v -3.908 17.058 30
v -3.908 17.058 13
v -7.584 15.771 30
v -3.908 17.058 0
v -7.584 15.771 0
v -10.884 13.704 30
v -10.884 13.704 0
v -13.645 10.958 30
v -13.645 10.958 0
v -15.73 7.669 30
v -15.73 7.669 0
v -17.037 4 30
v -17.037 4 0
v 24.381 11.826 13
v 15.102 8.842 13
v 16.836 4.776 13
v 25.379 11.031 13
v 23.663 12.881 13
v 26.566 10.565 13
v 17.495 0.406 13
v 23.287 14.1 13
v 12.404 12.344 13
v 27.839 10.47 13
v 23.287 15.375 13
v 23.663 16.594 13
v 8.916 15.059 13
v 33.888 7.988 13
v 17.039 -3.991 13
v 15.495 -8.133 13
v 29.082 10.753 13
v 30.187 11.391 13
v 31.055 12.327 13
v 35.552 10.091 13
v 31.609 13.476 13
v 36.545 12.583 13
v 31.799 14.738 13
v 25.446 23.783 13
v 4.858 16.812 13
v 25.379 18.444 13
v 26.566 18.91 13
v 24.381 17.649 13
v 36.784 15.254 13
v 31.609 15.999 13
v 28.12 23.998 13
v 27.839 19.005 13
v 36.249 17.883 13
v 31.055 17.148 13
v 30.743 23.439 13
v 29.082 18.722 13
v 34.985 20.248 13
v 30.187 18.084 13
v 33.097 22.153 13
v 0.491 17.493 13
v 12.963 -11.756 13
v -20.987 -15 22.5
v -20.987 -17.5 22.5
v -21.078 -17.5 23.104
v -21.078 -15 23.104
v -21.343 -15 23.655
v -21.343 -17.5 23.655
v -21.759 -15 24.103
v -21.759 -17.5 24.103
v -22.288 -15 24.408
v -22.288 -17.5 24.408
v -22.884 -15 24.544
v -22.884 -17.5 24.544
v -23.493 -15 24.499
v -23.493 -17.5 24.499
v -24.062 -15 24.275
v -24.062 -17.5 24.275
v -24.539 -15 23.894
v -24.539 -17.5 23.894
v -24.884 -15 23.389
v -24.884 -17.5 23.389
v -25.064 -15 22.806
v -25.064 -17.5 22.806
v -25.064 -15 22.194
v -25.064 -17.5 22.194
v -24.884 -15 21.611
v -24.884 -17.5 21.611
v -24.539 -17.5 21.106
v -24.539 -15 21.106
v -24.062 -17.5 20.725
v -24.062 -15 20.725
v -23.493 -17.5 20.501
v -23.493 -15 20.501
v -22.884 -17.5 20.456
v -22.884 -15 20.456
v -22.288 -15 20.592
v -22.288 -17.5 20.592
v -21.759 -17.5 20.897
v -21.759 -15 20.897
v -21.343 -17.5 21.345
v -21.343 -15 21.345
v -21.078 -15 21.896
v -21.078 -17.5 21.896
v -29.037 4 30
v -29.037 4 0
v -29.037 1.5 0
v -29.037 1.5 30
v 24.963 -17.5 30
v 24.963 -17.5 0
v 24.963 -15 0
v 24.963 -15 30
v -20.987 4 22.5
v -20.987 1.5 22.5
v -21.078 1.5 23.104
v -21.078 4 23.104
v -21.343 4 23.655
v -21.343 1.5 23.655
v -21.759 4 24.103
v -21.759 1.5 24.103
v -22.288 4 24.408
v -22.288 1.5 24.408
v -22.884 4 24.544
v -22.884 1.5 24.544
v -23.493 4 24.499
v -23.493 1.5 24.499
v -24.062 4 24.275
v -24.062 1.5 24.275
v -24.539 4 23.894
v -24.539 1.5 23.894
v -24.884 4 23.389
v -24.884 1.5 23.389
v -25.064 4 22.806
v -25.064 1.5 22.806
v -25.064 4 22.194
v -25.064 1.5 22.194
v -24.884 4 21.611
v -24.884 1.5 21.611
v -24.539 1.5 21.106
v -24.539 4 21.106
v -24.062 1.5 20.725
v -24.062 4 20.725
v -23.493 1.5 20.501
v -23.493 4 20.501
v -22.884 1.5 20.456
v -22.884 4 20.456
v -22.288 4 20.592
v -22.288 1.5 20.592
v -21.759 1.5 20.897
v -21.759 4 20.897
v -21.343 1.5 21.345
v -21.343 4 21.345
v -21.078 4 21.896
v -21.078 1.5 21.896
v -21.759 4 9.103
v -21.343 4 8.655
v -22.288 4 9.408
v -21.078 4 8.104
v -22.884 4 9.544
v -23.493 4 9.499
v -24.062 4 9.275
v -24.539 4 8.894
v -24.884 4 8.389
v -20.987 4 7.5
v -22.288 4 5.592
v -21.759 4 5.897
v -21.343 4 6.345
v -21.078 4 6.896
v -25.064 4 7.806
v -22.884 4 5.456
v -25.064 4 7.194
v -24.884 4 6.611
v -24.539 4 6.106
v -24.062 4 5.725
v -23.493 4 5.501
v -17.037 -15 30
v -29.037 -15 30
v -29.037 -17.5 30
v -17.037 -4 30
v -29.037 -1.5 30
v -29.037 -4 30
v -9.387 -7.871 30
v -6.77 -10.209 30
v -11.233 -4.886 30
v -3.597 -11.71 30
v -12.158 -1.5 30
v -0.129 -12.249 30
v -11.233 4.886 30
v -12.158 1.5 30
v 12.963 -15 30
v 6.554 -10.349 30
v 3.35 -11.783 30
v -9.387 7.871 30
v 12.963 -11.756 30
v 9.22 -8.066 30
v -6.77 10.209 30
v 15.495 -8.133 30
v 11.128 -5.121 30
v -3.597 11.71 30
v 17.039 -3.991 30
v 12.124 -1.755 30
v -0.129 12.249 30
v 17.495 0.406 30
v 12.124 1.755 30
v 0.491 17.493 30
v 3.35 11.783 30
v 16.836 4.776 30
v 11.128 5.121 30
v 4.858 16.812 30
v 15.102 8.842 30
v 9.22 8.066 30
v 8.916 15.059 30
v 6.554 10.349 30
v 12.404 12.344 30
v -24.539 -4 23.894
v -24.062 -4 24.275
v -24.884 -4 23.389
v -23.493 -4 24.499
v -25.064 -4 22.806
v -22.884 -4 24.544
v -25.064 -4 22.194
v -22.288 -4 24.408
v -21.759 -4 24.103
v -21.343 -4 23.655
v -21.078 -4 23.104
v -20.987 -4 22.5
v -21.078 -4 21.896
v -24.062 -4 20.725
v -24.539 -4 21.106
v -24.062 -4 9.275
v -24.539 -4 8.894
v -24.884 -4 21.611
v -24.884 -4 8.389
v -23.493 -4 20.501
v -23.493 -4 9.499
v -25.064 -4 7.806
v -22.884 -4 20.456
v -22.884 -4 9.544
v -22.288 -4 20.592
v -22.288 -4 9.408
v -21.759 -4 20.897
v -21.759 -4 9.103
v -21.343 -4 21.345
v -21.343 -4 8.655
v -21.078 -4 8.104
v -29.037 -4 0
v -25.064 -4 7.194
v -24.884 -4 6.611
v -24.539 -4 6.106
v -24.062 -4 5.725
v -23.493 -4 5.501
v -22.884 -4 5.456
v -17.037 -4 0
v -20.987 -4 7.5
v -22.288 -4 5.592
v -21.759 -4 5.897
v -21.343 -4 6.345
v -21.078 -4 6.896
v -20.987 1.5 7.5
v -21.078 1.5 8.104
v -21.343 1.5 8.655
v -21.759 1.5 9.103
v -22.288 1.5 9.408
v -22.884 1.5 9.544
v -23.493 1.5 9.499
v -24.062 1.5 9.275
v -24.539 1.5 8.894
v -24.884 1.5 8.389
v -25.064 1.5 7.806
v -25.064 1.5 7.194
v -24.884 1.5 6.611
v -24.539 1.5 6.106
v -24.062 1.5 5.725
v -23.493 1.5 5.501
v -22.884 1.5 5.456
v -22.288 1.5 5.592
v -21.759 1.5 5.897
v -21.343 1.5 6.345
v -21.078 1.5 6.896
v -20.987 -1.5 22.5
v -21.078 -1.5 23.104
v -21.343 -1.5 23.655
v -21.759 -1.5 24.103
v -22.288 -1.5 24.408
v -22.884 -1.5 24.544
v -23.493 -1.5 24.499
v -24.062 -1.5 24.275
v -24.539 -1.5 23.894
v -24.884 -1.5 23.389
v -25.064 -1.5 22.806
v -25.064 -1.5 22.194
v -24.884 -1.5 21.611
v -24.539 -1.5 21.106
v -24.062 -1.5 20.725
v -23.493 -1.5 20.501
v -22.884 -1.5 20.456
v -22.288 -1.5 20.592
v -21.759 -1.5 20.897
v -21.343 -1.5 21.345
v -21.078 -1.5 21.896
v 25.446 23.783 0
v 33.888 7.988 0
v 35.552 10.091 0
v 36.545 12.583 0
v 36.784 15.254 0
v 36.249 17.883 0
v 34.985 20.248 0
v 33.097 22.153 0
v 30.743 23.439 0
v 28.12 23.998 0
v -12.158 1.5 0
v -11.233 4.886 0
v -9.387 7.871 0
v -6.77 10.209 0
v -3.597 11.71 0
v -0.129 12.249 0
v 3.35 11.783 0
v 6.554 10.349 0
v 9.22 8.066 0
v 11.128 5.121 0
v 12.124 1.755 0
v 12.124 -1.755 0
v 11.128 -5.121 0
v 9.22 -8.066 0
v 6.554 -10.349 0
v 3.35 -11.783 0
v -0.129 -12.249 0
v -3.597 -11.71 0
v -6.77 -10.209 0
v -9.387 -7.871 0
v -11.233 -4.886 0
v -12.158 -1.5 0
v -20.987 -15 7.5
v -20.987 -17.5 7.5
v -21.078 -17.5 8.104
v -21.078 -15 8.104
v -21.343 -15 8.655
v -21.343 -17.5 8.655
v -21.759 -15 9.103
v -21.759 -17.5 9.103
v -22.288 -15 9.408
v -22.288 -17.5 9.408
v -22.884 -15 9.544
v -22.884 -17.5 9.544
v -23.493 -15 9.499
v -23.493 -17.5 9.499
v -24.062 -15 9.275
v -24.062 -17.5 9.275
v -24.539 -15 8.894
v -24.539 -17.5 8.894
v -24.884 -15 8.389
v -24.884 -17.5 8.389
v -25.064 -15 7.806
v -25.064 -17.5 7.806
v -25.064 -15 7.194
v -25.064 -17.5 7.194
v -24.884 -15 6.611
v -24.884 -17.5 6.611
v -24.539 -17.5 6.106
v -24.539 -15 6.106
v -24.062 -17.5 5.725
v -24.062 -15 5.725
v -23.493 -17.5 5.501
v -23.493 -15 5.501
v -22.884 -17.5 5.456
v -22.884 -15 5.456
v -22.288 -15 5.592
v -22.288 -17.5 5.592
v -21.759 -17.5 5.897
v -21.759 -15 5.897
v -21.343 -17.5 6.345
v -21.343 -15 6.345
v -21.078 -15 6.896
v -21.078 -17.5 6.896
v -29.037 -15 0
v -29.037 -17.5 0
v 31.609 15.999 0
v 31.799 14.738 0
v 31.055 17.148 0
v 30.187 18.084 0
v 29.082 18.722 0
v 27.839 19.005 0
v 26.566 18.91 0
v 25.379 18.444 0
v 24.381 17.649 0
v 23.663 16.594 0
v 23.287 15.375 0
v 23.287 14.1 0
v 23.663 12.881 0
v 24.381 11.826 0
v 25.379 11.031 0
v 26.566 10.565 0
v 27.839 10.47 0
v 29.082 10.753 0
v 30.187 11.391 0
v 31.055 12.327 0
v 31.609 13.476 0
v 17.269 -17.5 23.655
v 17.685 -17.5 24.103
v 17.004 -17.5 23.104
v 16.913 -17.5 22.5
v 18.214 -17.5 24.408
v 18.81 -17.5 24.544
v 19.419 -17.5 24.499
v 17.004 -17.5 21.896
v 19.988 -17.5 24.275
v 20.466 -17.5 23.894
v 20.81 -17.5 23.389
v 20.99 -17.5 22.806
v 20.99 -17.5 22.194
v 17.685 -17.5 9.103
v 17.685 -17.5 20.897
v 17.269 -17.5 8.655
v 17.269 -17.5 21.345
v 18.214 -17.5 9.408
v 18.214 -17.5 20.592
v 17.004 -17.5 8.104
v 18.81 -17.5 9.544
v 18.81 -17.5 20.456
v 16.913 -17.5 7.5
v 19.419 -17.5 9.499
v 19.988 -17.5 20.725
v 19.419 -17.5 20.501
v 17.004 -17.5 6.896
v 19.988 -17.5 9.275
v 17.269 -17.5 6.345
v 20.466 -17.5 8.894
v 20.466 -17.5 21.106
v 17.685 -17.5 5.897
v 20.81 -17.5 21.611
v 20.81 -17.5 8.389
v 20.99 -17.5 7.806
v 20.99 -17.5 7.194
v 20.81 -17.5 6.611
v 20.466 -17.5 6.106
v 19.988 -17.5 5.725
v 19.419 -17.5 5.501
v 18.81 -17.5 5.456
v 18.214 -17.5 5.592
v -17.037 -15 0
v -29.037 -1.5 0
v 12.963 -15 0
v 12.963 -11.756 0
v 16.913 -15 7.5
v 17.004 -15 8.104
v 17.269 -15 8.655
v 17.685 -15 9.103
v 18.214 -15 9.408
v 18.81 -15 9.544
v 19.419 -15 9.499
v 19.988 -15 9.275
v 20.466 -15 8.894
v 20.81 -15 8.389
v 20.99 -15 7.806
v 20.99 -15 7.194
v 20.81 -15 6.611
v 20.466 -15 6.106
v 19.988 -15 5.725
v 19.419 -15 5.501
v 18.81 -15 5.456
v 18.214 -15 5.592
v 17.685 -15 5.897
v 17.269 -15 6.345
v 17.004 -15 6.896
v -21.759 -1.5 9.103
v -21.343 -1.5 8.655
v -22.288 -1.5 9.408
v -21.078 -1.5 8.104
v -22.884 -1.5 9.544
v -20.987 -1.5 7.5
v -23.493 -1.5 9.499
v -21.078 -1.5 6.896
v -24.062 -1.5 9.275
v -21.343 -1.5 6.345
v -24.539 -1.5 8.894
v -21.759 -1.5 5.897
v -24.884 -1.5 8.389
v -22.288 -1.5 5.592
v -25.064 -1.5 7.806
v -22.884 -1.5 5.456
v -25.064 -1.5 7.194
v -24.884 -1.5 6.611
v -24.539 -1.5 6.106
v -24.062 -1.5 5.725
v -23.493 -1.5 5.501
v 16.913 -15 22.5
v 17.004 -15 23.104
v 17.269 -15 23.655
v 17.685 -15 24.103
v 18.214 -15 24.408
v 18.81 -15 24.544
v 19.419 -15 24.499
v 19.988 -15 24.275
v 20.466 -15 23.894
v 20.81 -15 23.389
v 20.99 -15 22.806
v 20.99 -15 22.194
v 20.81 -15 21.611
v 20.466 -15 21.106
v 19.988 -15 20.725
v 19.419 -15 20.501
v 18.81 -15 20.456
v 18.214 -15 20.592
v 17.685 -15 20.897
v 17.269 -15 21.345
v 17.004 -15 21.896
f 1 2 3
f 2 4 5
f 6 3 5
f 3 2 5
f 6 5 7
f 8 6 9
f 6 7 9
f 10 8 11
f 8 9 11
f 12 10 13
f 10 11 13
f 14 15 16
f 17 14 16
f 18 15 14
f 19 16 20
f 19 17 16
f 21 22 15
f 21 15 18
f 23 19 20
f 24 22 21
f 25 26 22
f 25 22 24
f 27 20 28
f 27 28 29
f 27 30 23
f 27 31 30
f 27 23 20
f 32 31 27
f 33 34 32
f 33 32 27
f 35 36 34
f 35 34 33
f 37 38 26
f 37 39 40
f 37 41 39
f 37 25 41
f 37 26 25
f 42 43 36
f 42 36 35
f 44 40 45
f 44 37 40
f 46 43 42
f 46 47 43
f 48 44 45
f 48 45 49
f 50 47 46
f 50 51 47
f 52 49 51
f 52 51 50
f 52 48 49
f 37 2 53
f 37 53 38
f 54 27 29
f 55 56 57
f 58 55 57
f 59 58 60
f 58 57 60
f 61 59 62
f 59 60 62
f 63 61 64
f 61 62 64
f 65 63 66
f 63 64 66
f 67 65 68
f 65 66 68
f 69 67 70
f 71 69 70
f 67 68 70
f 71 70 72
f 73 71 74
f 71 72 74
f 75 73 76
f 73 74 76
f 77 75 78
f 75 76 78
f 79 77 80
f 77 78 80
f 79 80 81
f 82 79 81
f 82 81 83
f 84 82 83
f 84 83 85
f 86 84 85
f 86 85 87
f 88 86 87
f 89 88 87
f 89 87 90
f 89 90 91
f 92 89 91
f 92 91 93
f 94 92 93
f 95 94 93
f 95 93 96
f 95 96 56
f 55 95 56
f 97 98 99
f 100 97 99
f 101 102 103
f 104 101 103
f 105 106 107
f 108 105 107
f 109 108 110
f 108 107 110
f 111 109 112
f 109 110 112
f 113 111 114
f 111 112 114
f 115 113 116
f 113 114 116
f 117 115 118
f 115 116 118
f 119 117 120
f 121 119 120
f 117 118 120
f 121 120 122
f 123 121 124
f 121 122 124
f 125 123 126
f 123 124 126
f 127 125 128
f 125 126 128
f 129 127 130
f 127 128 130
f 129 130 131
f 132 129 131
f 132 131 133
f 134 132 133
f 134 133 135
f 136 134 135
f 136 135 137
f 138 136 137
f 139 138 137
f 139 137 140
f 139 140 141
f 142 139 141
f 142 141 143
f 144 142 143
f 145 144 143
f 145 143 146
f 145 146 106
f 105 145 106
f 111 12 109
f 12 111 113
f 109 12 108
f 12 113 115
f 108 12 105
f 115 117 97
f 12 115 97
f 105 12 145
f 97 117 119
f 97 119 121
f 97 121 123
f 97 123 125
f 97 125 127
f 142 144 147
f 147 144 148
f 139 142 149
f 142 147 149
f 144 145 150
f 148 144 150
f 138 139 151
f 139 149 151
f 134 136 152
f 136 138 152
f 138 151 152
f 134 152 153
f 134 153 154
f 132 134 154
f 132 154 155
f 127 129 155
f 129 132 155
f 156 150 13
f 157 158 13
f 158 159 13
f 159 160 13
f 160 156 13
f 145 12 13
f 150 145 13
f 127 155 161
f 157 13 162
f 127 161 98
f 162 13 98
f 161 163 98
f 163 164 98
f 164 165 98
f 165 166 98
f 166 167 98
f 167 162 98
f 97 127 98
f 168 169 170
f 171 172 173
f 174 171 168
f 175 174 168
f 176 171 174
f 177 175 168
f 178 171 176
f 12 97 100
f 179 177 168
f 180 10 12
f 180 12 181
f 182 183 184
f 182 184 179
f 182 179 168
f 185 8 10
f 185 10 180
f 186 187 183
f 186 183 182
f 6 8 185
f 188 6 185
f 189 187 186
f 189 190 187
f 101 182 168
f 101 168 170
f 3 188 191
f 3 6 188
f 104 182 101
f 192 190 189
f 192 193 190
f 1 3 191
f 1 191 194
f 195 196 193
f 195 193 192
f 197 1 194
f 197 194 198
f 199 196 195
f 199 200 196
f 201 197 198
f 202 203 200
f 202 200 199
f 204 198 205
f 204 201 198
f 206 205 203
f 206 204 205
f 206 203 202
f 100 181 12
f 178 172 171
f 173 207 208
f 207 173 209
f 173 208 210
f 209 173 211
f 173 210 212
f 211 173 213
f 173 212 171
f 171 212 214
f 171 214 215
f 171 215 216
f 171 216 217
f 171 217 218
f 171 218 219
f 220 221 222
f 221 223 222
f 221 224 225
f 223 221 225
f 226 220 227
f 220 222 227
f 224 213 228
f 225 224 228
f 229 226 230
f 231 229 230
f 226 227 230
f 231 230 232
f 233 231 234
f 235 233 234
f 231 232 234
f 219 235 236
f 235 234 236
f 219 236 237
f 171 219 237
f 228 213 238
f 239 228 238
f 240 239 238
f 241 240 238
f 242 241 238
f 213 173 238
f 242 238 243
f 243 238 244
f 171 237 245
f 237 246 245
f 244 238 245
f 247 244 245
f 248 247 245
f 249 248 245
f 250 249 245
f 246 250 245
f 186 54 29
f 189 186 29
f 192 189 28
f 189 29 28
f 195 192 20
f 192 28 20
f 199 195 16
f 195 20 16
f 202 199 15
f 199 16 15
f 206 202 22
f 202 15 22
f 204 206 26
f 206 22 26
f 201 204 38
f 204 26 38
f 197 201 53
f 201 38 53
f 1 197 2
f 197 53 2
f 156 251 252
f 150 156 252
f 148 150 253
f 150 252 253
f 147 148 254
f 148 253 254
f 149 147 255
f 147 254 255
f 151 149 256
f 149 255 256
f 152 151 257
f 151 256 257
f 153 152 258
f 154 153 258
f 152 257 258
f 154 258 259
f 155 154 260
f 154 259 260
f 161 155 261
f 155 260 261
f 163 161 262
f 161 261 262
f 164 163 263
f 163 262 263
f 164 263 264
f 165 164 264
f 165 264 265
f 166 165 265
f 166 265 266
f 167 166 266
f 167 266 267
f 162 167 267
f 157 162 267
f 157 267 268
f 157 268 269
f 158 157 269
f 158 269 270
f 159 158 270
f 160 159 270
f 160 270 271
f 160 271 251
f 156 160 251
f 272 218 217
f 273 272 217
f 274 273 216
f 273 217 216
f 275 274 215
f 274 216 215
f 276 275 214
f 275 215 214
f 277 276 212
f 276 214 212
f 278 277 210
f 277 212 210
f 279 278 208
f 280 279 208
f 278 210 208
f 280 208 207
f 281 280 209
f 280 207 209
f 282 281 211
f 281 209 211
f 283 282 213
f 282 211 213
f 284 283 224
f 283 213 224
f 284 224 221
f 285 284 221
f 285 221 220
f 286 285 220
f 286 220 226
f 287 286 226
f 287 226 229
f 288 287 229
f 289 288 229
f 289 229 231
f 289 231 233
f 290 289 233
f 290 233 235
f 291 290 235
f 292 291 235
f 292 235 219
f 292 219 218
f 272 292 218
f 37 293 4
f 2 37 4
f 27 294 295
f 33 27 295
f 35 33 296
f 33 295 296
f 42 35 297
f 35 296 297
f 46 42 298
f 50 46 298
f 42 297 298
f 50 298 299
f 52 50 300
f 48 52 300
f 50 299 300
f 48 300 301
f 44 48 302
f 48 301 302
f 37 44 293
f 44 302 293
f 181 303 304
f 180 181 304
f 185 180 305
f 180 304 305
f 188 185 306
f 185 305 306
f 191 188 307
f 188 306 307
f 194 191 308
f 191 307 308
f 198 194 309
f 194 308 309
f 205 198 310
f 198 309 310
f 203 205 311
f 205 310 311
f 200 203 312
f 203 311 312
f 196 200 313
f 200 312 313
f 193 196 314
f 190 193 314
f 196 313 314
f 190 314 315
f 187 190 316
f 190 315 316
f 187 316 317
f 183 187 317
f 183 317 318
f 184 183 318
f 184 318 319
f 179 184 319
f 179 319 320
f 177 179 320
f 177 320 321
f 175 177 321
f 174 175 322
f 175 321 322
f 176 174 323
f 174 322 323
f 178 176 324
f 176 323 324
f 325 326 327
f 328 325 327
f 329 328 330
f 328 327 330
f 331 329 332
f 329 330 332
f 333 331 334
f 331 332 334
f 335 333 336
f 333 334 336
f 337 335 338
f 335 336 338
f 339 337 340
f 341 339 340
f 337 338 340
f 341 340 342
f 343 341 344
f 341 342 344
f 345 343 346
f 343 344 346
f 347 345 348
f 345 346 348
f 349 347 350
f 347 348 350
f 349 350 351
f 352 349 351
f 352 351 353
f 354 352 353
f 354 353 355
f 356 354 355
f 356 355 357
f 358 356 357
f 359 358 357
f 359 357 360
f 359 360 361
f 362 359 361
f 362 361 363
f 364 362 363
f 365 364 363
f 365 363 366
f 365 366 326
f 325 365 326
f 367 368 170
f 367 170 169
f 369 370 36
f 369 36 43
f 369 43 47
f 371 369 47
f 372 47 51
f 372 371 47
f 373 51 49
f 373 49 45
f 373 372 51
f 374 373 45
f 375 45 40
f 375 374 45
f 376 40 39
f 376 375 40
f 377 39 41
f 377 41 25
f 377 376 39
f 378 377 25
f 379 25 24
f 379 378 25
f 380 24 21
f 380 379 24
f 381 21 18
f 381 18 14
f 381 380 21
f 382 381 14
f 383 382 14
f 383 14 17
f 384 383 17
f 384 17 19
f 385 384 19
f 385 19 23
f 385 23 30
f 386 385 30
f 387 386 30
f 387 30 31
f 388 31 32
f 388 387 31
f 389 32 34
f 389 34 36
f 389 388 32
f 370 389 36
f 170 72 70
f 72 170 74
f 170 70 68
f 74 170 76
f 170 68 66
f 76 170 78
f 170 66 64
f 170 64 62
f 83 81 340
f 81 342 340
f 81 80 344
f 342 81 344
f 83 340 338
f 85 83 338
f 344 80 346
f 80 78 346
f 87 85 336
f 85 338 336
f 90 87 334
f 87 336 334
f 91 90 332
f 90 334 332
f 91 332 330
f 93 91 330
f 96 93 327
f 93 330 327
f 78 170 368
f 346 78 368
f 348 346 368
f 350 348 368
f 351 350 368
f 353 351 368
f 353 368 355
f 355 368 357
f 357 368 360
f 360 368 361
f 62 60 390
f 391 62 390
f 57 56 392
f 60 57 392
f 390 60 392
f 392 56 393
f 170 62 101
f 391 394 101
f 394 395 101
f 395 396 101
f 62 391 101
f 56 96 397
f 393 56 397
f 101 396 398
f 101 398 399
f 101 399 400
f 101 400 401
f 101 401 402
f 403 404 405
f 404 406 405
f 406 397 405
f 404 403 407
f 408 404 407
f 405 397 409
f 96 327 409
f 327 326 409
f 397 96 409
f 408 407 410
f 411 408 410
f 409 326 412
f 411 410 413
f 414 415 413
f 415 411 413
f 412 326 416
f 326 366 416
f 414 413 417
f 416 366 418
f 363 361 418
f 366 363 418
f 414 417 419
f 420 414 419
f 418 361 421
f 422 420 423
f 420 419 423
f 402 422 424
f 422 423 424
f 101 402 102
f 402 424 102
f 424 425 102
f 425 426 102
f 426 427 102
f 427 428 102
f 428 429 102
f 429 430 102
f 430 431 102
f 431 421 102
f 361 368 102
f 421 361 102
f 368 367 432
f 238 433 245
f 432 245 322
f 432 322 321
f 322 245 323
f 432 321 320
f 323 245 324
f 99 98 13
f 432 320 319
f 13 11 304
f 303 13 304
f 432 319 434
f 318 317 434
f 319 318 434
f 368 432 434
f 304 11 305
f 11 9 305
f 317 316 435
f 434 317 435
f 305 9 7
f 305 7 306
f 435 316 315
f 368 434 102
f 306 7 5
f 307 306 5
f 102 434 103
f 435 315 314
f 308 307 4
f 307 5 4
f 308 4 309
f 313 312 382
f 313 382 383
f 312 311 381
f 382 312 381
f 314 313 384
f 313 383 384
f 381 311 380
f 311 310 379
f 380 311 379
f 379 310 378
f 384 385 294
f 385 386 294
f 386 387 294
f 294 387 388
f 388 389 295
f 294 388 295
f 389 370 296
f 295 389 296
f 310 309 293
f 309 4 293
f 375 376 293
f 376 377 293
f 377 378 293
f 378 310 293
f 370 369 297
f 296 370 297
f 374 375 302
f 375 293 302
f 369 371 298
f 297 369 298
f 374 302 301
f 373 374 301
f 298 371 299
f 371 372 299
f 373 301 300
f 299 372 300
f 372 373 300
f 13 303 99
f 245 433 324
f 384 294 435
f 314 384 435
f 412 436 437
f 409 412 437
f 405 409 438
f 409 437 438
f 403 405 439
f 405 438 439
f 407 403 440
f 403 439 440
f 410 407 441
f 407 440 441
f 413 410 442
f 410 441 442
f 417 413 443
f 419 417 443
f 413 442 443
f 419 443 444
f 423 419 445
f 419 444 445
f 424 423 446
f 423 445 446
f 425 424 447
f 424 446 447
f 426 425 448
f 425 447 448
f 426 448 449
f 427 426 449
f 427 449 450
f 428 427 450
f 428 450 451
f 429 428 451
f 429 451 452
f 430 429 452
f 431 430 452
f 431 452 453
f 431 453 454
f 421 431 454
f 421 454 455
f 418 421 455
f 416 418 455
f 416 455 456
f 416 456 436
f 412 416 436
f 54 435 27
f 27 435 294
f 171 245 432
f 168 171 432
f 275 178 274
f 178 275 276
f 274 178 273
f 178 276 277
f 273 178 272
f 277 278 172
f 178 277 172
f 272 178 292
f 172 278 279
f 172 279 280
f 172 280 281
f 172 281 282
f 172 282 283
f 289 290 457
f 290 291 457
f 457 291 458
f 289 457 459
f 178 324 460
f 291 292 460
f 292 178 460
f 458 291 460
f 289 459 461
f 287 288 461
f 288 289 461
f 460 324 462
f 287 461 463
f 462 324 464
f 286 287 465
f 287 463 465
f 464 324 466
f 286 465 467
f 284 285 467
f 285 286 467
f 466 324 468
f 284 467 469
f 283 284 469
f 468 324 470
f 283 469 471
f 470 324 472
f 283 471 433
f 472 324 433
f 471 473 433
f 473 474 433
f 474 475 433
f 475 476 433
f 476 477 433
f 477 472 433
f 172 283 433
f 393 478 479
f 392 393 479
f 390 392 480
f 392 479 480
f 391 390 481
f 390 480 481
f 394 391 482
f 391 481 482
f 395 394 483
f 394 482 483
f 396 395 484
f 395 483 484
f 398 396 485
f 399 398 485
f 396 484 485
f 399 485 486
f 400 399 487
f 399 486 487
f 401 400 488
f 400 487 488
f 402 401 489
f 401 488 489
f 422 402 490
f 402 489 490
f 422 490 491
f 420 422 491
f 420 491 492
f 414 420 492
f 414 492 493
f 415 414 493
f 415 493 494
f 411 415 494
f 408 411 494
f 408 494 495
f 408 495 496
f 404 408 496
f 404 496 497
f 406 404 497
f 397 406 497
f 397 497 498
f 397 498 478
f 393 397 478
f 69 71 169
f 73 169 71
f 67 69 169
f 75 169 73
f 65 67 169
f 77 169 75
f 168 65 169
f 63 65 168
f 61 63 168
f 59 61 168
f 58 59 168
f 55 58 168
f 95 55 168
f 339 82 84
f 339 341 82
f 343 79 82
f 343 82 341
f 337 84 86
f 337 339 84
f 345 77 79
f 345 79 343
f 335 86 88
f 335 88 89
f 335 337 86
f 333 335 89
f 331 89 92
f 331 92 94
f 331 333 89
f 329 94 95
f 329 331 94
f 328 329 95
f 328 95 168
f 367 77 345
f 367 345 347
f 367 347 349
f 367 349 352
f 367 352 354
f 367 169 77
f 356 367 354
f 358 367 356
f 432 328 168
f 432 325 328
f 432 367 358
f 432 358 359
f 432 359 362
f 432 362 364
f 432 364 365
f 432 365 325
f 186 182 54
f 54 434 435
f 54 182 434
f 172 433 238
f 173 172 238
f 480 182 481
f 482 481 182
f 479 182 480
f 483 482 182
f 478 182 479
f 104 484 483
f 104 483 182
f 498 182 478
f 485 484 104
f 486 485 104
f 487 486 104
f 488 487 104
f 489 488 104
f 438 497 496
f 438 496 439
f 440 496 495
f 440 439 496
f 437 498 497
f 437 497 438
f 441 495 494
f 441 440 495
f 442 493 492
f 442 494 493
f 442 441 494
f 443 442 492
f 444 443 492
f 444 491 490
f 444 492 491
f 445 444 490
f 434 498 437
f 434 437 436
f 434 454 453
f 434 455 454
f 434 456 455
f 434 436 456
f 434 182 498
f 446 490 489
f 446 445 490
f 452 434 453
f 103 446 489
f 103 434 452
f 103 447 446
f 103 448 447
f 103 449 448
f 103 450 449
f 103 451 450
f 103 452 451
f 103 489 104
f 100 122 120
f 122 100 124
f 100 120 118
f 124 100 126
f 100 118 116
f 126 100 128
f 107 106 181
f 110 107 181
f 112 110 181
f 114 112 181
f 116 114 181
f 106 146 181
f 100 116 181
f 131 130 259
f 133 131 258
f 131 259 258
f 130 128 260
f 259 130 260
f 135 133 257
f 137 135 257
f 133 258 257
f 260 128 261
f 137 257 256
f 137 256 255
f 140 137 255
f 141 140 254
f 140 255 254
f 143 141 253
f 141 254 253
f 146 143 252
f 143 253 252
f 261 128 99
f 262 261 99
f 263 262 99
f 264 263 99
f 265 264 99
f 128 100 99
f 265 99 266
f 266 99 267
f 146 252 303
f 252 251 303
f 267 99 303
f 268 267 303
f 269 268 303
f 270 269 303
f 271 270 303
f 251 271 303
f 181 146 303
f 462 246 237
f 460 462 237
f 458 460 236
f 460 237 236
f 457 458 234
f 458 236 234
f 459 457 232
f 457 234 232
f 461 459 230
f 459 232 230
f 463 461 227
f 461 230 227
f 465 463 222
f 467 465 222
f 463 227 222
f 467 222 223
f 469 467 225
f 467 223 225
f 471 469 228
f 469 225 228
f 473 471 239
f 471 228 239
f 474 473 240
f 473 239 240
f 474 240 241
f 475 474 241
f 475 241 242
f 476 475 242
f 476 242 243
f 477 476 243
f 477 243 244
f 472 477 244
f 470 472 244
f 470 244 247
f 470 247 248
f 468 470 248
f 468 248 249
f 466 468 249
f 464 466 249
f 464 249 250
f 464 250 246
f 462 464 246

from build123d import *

# Parameters (mm, degrees)
F0_W     = 12
F0_H     = 2.5
F1_DEPTH = 30
F3_D     = 4.1
F5_D     = 4.1
F5_DEPTH = 2.501
F0_R     = 4.2799
F6_DEPTH = 13


with BuildPart() as f1:
    # F0 (on Top) → F1 (new body)
    with BuildSketch(Plane.XY):
        with Locations((-23.0367250374, -16.25)):
            Rectangle(F0_W, F0_H)
        with Locations((18.9632749626, -16.25)):
            Rectangle(F0_W, F0_H)
        with BuildLine():
            ThreePointArc((-12.1578164158, 1.5), (12.25, 0), (-12.1578164158, -1.5))
            Line((-12.1578164158, -1.5), (-29.0367250374, -1.5))
            Line((-29.0367250374, -1.5), (-29.0367250374, -4))
            Line((-29.0367250374, -4), (-17.0367250374, -4))
            Line((-17.0367250374, -4), (-17.0367250374, -15))
            Line((-17.0367250374, -15), (-17.0367250374, -17.5))
            Line((-17.0367250374, -17.5), (12.9632749626, -17.5))
            Line((12.9632749626, -17.5), (12.9632749626, -15))
            Line((12.9632749626, -15), (12.9632749626, -11.7559985643))
            ThreePointArc((12.9632749626, -11.7559985643), (15.1017388634, 8.8423686477), (-3.9079399616, 17.0580774197))
            ThreePointArc((-3.9079399616, 17.0580774197), (-12.340911411, 12.4077357139), (-17.0367250374, 4))
            Line((-17.0367250374, 4), (-29.0367250374, 4))
            Line((-29.0367250374, 4), (-29.0367250374, 1.5))
            Line((-29.0367250374, 1.5), (-12.1578164158, 1.5))
        make_face()
    extrude(amount=F1_DEPTH)

    # F3 (through all)
    with Locations(Plane(origin=(0, 4, 0), x_dir=(-1, 0, 0), z_dir=(0, 1, 0))):
        with Locations((23.0367250374, 7.5), (23.0367250374, 22.5)):
            Hole(F3_D / 2)

    # F5 (through all, one way)
    with BuildSketch(Plane(origin=(0, -15, 0), x_dir=(-1, 0, 0), z_dir=(0, 1, 0))):
        with Locations((-18.9632749626, 22.5), (-18.9632749626, 7.5)):
            Circle(F5_D / 2)
    extrude(amount=-F5_DEPTH, mode=Mode.SUBTRACT)

    # F0 (on Top) → F6 (join)
    with BuildSketch(Plane.XY):
        with BuildLine():
            Line((25.4464586396, 23.7830572941), (-3.9079399616, 17.0580774197))
            ThreePointArc((-3.9079399616, 17.0580774197), (15.1017388634, 8.8423686477), (12.9632749626, -11.7559985643))
            Line((12.9632749626, -11.7559985643), (33.8875290885, 7.9880305701))
            ThreePointArc((33.8875290885, 7.9880305701), (19.3342866208, 10.3636090033), (25.4464586396, 23.7830572941))
        make_face()
        with BuildLine():
            ThreePointArc((36.7986610424, 14.7375), (33.3017440504, 21.9951615751), (25.4464586396, 23.7830572941))
            ThreePointArc((25.4464586396, 23.7830572941), (19.3342866208, 10.3636090033), (33.8875290885, 7.9880305701))
            ThreePointArc((33.8875290885, 7.9880305701), (36.0398547105, 11.062243994), (36.7986610424, 14.7375))
        make_face()
        with Locations((27.5187610424, 14.7375)):
            Circle(F0_R, mode=Mode.SUBTRACT)
    extrude(amount=F6_DEPTH)


solid = f1.part
